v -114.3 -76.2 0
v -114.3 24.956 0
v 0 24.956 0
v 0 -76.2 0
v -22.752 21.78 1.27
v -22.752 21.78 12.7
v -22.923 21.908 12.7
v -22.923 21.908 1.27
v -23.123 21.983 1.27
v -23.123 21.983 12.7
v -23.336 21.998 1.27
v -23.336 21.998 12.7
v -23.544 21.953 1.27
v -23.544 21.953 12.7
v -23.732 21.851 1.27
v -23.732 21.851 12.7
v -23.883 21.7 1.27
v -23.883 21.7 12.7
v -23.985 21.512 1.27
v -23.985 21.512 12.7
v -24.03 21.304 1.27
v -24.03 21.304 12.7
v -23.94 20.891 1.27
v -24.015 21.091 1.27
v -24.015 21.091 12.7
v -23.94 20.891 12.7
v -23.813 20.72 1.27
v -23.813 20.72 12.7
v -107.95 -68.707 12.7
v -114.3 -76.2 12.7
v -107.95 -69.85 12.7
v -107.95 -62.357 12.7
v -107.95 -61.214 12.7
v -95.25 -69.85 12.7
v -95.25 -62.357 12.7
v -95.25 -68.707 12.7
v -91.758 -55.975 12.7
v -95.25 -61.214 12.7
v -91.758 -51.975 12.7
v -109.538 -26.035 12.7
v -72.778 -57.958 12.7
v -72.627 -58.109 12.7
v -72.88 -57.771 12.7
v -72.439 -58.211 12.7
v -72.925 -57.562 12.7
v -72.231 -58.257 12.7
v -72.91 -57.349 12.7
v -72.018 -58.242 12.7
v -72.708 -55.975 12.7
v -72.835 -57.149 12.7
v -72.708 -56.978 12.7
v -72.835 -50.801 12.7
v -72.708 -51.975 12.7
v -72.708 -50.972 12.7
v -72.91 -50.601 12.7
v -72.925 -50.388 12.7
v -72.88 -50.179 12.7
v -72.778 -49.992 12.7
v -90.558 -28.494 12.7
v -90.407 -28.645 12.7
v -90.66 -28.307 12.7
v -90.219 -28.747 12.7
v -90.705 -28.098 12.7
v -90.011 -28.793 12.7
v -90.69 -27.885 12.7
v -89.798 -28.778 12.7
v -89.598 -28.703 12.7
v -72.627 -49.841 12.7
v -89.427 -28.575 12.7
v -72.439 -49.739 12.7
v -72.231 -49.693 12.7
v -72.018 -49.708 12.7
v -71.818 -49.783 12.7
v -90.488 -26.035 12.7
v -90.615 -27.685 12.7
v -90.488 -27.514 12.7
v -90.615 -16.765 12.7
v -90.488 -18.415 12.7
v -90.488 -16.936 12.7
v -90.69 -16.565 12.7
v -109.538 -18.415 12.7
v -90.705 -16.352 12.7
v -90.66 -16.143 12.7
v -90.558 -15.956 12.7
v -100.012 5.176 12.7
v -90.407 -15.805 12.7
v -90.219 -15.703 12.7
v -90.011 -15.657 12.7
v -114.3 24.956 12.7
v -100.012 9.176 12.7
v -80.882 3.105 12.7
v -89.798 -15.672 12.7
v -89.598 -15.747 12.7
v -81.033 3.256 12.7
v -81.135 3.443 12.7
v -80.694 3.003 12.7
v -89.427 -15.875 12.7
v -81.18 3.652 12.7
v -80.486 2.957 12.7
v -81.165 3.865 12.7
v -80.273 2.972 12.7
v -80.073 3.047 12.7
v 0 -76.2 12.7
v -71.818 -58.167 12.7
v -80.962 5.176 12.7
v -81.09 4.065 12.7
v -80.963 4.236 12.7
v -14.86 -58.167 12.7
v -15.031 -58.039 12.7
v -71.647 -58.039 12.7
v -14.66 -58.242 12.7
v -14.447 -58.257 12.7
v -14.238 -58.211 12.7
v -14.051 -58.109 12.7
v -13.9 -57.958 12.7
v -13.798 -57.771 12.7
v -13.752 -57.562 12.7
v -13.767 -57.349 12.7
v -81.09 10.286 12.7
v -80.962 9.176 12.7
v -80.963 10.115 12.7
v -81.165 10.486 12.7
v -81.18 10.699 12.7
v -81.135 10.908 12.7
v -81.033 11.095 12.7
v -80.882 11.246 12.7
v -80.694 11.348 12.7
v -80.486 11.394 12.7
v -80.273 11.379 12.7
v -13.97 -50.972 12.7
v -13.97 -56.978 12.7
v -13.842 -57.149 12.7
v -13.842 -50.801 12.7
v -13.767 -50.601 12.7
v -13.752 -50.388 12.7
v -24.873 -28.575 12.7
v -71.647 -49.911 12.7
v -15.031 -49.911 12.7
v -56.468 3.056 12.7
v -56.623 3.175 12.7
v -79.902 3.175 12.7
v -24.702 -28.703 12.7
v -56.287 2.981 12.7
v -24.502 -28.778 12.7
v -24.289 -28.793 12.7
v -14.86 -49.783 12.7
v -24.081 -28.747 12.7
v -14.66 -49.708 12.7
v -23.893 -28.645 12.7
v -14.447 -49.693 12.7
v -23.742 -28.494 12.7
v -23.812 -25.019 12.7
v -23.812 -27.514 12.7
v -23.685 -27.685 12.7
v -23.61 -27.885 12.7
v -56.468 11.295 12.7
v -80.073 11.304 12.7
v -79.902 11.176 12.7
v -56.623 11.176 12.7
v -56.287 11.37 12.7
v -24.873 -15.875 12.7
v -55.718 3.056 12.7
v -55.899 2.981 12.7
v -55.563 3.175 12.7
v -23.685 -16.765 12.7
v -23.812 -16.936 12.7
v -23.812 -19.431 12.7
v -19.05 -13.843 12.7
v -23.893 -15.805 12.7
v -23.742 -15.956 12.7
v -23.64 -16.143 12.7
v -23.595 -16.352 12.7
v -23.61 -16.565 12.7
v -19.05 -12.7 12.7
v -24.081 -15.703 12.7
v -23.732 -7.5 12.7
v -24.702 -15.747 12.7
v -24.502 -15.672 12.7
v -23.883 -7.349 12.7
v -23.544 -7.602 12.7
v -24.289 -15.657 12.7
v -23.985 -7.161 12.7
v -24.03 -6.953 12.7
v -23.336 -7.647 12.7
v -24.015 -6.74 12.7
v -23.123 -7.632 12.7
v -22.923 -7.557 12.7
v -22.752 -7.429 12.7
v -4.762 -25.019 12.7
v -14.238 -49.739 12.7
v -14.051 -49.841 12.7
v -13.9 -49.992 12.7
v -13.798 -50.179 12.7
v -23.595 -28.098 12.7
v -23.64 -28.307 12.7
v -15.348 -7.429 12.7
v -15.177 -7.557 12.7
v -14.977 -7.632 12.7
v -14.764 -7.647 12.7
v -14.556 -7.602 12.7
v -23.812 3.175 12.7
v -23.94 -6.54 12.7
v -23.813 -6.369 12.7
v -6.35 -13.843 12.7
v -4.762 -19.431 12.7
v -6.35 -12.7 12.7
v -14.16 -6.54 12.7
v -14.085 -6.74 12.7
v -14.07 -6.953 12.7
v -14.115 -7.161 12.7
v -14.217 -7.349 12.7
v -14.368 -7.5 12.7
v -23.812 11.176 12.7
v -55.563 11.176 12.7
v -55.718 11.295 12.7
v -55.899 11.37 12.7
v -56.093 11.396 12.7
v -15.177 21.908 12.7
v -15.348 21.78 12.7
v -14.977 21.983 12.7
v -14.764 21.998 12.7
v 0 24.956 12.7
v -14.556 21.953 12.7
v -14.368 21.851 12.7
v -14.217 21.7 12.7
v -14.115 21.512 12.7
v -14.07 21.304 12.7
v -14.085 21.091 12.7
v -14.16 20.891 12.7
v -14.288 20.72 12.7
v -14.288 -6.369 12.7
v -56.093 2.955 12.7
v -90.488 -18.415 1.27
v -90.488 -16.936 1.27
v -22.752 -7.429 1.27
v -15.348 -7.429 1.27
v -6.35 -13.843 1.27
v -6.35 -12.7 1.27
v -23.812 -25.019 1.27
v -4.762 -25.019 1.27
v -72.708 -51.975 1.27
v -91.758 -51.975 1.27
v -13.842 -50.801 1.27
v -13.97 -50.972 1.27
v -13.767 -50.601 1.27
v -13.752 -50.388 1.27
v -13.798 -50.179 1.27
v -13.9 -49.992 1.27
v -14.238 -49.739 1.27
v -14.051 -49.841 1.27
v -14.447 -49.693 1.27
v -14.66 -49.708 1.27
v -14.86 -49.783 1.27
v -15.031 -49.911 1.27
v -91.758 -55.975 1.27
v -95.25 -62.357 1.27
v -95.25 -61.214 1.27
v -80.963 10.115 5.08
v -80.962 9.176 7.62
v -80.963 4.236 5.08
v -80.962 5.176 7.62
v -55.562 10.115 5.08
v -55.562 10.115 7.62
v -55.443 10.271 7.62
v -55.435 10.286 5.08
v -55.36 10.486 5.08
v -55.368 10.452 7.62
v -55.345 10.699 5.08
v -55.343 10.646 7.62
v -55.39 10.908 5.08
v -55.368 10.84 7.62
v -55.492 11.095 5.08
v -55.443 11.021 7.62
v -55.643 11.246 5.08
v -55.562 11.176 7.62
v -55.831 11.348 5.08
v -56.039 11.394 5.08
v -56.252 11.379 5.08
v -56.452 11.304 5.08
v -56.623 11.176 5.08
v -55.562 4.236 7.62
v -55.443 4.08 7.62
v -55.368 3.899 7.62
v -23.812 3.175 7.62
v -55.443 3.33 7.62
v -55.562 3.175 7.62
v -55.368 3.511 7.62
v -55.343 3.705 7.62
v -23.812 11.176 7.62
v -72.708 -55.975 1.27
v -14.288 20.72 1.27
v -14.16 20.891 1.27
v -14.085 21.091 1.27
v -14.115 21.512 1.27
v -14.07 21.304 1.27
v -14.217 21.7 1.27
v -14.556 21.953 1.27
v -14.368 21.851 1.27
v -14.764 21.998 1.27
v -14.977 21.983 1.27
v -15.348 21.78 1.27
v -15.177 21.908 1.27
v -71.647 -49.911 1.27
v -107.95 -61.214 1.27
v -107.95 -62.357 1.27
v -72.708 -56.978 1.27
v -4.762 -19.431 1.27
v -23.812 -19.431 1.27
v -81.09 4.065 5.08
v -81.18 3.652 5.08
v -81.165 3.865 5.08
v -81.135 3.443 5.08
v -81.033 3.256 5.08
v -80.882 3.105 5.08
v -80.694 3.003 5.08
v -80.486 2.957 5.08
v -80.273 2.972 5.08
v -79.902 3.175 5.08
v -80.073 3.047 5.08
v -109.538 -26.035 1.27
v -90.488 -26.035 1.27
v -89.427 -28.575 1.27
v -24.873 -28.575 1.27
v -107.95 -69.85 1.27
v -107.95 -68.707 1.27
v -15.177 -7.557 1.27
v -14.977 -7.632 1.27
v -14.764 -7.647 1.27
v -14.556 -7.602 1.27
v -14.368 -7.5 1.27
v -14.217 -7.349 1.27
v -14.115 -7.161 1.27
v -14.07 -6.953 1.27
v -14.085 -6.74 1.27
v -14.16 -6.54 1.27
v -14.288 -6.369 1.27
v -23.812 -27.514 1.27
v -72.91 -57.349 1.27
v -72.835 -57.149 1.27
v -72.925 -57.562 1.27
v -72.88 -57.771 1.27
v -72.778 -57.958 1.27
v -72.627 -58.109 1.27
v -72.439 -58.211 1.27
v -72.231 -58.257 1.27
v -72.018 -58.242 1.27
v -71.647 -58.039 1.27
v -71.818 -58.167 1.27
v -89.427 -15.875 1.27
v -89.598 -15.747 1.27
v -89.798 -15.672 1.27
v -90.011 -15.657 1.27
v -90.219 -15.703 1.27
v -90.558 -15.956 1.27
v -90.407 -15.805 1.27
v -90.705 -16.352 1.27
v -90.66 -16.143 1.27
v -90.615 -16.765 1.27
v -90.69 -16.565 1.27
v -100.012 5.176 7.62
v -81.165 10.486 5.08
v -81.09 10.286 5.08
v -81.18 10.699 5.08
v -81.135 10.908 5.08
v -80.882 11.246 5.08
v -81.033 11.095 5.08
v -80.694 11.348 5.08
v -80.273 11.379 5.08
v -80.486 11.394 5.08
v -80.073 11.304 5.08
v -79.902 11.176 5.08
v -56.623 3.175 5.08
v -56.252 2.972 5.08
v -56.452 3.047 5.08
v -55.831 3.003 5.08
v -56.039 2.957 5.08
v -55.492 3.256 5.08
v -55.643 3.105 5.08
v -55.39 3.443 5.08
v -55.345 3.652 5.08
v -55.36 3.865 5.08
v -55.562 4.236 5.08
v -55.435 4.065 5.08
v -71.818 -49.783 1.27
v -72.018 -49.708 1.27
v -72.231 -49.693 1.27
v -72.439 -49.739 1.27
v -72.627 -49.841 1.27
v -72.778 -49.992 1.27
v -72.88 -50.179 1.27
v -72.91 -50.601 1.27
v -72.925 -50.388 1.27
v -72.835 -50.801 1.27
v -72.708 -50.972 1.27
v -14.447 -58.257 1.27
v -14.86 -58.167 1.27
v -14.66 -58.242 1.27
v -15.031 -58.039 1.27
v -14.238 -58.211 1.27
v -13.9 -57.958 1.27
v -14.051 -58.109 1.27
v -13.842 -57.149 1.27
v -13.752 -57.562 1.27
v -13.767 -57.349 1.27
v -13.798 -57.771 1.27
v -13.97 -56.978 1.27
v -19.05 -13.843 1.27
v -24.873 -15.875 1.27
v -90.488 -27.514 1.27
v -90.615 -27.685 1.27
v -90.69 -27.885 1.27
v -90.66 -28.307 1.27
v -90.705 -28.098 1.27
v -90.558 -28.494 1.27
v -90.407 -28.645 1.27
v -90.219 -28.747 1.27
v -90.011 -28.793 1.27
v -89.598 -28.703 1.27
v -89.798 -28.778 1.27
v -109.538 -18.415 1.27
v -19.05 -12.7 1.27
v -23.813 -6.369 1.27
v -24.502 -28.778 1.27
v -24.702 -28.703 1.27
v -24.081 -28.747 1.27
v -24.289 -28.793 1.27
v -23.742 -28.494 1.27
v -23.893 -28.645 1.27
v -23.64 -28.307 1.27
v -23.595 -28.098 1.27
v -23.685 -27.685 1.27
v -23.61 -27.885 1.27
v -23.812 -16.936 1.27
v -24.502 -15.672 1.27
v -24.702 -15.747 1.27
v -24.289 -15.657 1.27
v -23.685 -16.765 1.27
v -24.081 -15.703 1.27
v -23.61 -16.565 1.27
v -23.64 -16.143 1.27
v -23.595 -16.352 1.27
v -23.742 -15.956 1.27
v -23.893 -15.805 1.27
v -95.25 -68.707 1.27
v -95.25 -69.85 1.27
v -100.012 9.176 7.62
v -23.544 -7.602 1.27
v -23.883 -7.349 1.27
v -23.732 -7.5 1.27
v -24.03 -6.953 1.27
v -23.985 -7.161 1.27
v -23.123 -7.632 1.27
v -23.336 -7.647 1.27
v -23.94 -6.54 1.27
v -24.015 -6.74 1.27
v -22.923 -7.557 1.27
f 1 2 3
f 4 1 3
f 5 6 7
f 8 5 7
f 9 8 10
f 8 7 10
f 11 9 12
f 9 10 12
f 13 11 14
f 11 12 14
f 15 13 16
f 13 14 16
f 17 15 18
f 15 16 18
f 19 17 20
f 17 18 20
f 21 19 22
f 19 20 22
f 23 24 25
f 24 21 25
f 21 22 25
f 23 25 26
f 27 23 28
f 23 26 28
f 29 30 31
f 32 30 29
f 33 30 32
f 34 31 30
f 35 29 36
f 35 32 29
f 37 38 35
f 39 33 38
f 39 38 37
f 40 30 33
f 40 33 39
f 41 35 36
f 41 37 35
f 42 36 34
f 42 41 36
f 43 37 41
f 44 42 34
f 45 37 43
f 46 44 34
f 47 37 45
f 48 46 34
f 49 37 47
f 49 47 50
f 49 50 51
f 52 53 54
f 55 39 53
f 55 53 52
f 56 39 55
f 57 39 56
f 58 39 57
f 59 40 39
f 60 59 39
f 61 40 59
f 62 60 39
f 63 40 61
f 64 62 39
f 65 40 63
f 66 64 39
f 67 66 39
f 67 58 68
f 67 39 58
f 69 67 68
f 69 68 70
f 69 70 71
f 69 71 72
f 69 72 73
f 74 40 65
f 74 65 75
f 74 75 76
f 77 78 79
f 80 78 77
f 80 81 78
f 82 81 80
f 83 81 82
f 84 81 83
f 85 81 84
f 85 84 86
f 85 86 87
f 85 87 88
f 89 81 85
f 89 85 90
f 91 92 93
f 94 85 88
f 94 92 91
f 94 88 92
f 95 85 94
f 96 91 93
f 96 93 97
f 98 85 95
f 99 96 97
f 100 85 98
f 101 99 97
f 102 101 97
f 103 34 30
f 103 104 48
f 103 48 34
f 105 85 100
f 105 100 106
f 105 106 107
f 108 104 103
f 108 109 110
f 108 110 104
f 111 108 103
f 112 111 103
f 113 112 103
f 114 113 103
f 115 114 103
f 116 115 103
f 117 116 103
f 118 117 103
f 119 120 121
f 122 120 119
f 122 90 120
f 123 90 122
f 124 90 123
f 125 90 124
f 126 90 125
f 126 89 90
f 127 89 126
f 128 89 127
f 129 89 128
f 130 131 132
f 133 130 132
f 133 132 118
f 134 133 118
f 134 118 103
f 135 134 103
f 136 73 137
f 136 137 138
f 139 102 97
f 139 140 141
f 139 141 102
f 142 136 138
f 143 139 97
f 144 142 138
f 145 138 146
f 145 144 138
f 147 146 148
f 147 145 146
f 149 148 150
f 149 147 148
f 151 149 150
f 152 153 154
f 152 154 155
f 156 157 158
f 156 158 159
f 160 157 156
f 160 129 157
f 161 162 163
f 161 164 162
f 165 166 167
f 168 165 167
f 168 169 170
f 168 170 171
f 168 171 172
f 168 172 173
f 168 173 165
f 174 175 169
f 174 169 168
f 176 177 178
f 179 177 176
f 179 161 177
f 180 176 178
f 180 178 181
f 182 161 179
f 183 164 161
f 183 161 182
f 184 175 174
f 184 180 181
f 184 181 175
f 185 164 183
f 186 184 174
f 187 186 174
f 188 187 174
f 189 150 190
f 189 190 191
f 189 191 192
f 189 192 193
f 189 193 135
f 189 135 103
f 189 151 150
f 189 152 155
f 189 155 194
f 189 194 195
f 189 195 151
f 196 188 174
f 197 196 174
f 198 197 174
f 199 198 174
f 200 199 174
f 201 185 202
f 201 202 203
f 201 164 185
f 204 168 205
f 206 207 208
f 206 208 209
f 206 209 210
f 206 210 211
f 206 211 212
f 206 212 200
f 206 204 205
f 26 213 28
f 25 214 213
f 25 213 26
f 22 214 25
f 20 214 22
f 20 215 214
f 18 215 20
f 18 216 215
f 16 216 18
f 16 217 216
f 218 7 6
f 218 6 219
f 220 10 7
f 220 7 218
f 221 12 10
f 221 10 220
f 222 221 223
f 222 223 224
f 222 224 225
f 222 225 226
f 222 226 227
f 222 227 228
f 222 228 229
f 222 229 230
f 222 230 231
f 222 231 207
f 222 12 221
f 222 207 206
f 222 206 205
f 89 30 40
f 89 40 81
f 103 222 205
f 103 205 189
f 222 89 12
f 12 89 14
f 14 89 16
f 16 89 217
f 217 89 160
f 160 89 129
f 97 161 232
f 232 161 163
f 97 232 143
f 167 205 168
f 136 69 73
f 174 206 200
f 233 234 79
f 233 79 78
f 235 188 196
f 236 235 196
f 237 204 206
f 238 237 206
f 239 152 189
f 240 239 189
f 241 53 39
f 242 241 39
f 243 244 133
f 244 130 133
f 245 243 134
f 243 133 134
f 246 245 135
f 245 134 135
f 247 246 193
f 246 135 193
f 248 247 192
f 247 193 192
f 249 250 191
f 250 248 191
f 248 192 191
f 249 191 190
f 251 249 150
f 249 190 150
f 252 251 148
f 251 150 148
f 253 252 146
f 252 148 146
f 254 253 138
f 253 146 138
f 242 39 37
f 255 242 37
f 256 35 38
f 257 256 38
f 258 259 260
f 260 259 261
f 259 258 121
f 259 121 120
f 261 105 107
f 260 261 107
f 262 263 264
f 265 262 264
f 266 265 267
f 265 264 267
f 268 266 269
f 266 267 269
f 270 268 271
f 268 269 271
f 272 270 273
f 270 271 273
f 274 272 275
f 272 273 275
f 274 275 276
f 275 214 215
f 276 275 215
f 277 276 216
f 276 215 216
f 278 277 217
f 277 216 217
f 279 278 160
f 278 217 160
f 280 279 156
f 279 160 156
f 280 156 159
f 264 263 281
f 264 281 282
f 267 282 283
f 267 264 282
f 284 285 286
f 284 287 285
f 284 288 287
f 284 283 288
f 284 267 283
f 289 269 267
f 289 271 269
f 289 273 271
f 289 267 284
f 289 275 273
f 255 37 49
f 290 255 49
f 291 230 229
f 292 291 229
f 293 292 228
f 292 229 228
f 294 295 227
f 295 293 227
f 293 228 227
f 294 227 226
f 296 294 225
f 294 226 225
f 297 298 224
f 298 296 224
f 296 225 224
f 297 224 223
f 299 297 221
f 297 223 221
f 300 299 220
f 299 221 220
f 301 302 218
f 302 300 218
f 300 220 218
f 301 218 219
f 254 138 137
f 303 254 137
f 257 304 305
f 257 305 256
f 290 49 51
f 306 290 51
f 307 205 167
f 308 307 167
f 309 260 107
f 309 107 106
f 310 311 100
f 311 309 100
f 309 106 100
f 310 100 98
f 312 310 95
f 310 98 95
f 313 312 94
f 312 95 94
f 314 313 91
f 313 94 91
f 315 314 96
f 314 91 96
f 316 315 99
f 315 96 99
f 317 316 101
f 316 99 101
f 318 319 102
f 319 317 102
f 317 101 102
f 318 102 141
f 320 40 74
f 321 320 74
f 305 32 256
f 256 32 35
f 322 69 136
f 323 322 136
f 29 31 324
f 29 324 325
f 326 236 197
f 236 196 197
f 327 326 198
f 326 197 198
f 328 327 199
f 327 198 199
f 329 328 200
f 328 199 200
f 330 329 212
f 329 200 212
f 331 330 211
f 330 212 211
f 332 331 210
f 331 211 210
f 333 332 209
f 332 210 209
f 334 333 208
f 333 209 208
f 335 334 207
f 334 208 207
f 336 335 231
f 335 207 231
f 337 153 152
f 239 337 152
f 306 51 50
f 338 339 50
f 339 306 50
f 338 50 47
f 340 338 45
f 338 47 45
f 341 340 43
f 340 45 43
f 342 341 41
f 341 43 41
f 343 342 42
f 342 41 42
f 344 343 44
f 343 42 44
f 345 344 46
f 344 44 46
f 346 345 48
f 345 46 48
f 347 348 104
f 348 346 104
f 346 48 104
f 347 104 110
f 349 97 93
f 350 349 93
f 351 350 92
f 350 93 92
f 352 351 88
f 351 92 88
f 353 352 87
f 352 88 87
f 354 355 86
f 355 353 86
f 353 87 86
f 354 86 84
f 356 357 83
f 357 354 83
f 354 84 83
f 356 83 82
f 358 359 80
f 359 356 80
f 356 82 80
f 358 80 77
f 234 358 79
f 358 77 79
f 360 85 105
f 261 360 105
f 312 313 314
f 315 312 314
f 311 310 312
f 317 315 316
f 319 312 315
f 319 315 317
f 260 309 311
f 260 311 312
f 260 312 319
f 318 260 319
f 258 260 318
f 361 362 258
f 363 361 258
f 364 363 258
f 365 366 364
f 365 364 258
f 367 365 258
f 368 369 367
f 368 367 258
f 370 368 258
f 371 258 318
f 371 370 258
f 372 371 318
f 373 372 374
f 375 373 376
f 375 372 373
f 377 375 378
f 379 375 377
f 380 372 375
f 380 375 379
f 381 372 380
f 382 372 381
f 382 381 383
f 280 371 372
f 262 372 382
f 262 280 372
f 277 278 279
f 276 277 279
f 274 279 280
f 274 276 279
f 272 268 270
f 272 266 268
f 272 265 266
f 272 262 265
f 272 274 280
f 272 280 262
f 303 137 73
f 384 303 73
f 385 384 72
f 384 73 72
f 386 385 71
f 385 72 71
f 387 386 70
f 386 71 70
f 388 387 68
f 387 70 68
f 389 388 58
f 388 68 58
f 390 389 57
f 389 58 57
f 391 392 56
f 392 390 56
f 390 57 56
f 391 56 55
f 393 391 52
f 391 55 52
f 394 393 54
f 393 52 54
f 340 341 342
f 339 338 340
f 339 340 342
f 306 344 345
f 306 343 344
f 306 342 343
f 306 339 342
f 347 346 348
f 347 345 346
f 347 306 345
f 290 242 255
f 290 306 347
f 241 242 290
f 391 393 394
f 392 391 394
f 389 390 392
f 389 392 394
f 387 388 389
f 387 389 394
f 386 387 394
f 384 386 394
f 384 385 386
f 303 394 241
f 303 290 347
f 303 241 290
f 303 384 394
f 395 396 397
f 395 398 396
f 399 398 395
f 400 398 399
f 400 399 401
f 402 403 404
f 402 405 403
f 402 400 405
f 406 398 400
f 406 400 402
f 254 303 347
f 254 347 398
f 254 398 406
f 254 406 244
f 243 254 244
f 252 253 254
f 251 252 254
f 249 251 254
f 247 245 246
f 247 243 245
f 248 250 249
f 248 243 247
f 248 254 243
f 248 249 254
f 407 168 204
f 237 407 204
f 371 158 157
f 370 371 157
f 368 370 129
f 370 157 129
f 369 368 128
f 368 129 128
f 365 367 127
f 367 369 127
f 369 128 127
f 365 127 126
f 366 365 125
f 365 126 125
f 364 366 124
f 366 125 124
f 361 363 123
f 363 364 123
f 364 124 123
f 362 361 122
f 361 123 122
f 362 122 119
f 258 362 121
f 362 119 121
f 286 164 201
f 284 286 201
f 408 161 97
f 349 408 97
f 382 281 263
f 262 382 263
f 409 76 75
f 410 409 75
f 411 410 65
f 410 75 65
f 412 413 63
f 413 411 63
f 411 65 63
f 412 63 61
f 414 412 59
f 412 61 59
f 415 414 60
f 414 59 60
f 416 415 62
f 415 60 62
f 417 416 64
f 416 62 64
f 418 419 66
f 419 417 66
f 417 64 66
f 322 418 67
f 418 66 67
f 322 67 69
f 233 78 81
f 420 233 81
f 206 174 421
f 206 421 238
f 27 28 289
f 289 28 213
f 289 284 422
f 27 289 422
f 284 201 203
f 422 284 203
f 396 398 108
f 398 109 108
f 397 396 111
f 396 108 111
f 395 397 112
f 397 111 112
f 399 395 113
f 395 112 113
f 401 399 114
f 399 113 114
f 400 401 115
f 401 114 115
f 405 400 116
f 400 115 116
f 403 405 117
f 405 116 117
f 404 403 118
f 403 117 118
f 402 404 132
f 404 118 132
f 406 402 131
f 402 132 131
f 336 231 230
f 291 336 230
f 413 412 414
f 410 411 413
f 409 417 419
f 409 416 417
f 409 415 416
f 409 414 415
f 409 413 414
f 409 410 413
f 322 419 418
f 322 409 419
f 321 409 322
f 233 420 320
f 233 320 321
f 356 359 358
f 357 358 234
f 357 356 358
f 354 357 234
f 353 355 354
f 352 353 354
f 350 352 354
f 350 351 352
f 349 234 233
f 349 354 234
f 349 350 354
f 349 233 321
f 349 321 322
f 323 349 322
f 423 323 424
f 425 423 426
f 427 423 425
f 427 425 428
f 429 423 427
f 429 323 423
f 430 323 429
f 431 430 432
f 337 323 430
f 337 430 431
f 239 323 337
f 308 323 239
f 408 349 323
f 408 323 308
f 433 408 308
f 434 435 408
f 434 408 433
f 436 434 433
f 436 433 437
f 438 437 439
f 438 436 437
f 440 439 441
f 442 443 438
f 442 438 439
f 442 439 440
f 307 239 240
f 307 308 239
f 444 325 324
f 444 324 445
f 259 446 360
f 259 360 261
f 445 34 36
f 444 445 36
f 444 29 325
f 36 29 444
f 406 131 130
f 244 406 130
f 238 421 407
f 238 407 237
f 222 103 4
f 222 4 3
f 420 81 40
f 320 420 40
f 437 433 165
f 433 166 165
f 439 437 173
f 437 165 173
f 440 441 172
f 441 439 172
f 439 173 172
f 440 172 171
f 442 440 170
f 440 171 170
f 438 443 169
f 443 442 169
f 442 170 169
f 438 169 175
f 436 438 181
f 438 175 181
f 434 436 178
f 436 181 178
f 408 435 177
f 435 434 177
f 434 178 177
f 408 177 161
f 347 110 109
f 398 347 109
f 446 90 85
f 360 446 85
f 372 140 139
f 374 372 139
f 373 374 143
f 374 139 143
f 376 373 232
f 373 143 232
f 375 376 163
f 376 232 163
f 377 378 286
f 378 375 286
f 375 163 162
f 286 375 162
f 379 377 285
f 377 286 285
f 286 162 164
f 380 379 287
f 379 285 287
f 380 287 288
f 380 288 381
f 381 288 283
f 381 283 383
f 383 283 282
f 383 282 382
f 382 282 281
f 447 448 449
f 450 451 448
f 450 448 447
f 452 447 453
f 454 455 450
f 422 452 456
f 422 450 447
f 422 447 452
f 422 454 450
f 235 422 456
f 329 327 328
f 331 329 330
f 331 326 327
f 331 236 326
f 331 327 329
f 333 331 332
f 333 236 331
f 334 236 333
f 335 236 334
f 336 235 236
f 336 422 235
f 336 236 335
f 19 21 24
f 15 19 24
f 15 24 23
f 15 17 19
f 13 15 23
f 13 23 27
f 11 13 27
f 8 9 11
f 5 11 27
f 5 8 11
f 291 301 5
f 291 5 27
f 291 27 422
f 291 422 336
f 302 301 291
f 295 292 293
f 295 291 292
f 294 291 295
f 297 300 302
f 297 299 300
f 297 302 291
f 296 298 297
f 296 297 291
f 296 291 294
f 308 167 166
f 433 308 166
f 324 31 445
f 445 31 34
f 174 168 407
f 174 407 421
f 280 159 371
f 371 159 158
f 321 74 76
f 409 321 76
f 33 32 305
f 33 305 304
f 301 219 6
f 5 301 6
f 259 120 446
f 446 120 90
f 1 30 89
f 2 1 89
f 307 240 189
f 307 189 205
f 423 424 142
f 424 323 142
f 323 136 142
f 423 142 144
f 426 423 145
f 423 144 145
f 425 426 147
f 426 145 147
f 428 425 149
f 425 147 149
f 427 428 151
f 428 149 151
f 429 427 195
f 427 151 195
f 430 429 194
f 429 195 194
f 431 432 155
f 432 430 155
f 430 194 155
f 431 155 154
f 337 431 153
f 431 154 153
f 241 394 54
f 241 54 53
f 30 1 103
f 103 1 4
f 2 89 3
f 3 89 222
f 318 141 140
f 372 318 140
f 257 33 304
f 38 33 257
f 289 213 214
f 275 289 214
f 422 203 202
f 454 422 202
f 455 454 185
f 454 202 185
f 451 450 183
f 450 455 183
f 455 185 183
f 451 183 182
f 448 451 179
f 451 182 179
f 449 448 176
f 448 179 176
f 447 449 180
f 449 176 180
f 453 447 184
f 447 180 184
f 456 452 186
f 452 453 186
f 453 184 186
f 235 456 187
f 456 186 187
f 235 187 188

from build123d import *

# Parameters (mm, degrees)
F0_W      = 114.3
F0_H      = 76.2
F1_DEPTH  = 12.7
F3_DEPTH  = 11.43
F4_W      = 12.7
F4_H      = 1.143
F5_DEPTH  = 11.43
F8_DEPTH  = 11.43
F9_R      = 0.75
F10_DEPTH = 11.43
F11_W     = 114.3
F11_H     = 24.9555
F12_DEPTH = 12.7
F14_DEPTH = 11.43
F16_DEPTH = 5.08
F18_W     = 25.4
F18_H     = 8.001
F19_DEPTH = 2.54
F21_R     = 0.75
F22_DEPTH = 7.62
F23_R     = 0.75
F24_DEPTH = 11.43


with BuildPart() as f1:
    # F0 (on Top) → F1 (new body)
    with BuildSketch(Plane.XY):
        with Locations((-57.15, -38.1)):
            Rectangle(F0_W, F0_H)
    extrude(amount=F1_DEPTH)

    # F2 (on face) → F3 (cut)
    with BuildSketch(Plane.XY.offset(12.7)):
        Polygon((-90.4875, -18.415), (-109.5375, -18.415), (-109.5375, -26.035), (-90.4875, -26.035), (-90.4875, -28.575), (-23.8125, -28.575), (-23.8125, -25.019), (-4.7625, -25.019), (-4.7625, -19.431), (-23.8125, -19.431), (-23.8125, -15.875), (-90.4875, -15.875), align=None)
    extrude(amount=-F3_DEPTH, mode=Mode.SUBTRACT)

    # F4 (on face) → F5 (cut)
    with BuildSketch(Plane.XY.offset(12.7)):
        with Locations((-12.7, -13.2715)):
            Rectangle(F4_W, F4_H)
        with Locations((-101.6, -69.2785)):
            Rectangle(F4_W, F4_H)
        with Locations((-101.6, -61.7855)):
            Rectangle(F4_W, F4_H)
    extrude(amount=-F5_DEPTH, mode=Mode.SUBTRACT)

    # F7 (on face) → F8 (cut)
    with BuildSketch(Plane.XY.offset(12.7)):
        Polygon((-91.7575, -55.975), (-72.7075, -55.975), (-72.7075, -58.039), (-13.97, -58.039), (-13.97, -49.911), (-72.7075, -49.911), (-72.7075, -51.975), (-91.7575, -51.975), align=None)
    extrude(amount=-F8_DEPTH, mode=Mode.SUBTRACT)

    # F9 (on face) → F10 (cut)
    with BuildSketch(Plane.XY.offset(12.7)):
        with Locations((-89.9571699141, -16.4053300859)):
            Circle(F9_R)
        with Locations((-89.9571699141, -28.0446699141)):
            Circle(F9_R)
        with Locations((-24.3428300859, -28.0446699141)):
            Circle(F9_R)
        with Locations((-24.3428300859, -16.4053300859)):
            Circle(F9_R)
        with Locations((-14.5003300859, -50.4413300859)):
            Circle(F9_R)
        with Locations((-14.5003300859, -57.5086699141)):
            Circle(F9_R)
        with Locations((-72.1771699141, -50.4413300859)):
            Circle(F9_R)
        with Locations((-72.1771699141, -57.5086699141)):
            Circle(F9_R)
    extrude(amount=-F10_DEPTH, mode=Mode.SUBTRACT)

    # F11 (on face) → F12 (join)
    with BuildSketch(Plane.XY.offset(12.7)):
        with Locations((-57.15, 12.47775)):
            Rectangle(F11_W, F11_H)
    extrude(amount=-F12_DEPTH)

    # F13 (on face) → F14 (cut)
    with BuildSketch(Plane.XY.offset(12.7)):
        Polygon((-14.2875, 21.7805), (-23.8125, 21.7805), (-23.8125, 11.176), (-23.8125, 3.175), (-23.8125, -7.4295), (-14.2875, -7.4295), align=None)
    extrude(amount=-F14_DEPTH, mode=Mode.SUBTRACT)

    # F15 (on face) → F16 (cut)
    with BuildSketch(Plane.XY.offset(12.7)):
        Polygon((-23.8125, 11.176), (-80.9625, 11.176), (-80.9625, 9.1755), (-100.0125, 9.1755), (-100.0125, 5.1755), (-80.9625, 5.1755), (-80.9625, 3.175), (-23.8125, 3.175), align=None)
    extrude(amount=-F16_DEPTH, mode=Mode.SUBTRACT)

    # F18 (on 3pt) → F19 (cut)
    with BuildSketch(Plane.XY.offset(7.62)):
        with Locations((-68.2625, 7.1755)):
            Rectangle(F18_W, F18_H)
    extrude(amount=-F19_DEPTH, mode=Mode.SUBTRACT)

    # F21 (on face) → F22 (cut)
    with BuildSketch(Plane.XY.offset(12.7)):
        with Locations((-56.0928300859, 10.6456699141)):
            Circle(F21_R)
        with Locations((-56.0928300859, 3.7053300859)):
            Circle(F21_R)
        with Locations((-80.4321699141, 3.7053300859)):
            Circle(F21_R)
        with Locations((-80.4321699141, 10.6456699141)):
            Circle(F21_R)
    extrude(amount=-F22_DEPTH, mode=Mode.SUBTRACT)

    # F23 (on face) → F24 (cut)
    with BuildSketch(Plane.XY.offset(12.7)):
        with Locations((-23.2821699141, -6.8991699141)):
            Circle(F23_R)
        with Locations((-14.8178300859, -6.8991699141)):
            Circle(F23_R)
        with Locations((-23.2821699141, 21.2501699141)):
            Circle(F23_R)
        with Locations((-14.8178300859, 21.2501699141)):
            Circle(F23_R)
    extrude(amount=-F24_DEPTH, mode=Mode.SUBTRACT)


solid = f1.part
